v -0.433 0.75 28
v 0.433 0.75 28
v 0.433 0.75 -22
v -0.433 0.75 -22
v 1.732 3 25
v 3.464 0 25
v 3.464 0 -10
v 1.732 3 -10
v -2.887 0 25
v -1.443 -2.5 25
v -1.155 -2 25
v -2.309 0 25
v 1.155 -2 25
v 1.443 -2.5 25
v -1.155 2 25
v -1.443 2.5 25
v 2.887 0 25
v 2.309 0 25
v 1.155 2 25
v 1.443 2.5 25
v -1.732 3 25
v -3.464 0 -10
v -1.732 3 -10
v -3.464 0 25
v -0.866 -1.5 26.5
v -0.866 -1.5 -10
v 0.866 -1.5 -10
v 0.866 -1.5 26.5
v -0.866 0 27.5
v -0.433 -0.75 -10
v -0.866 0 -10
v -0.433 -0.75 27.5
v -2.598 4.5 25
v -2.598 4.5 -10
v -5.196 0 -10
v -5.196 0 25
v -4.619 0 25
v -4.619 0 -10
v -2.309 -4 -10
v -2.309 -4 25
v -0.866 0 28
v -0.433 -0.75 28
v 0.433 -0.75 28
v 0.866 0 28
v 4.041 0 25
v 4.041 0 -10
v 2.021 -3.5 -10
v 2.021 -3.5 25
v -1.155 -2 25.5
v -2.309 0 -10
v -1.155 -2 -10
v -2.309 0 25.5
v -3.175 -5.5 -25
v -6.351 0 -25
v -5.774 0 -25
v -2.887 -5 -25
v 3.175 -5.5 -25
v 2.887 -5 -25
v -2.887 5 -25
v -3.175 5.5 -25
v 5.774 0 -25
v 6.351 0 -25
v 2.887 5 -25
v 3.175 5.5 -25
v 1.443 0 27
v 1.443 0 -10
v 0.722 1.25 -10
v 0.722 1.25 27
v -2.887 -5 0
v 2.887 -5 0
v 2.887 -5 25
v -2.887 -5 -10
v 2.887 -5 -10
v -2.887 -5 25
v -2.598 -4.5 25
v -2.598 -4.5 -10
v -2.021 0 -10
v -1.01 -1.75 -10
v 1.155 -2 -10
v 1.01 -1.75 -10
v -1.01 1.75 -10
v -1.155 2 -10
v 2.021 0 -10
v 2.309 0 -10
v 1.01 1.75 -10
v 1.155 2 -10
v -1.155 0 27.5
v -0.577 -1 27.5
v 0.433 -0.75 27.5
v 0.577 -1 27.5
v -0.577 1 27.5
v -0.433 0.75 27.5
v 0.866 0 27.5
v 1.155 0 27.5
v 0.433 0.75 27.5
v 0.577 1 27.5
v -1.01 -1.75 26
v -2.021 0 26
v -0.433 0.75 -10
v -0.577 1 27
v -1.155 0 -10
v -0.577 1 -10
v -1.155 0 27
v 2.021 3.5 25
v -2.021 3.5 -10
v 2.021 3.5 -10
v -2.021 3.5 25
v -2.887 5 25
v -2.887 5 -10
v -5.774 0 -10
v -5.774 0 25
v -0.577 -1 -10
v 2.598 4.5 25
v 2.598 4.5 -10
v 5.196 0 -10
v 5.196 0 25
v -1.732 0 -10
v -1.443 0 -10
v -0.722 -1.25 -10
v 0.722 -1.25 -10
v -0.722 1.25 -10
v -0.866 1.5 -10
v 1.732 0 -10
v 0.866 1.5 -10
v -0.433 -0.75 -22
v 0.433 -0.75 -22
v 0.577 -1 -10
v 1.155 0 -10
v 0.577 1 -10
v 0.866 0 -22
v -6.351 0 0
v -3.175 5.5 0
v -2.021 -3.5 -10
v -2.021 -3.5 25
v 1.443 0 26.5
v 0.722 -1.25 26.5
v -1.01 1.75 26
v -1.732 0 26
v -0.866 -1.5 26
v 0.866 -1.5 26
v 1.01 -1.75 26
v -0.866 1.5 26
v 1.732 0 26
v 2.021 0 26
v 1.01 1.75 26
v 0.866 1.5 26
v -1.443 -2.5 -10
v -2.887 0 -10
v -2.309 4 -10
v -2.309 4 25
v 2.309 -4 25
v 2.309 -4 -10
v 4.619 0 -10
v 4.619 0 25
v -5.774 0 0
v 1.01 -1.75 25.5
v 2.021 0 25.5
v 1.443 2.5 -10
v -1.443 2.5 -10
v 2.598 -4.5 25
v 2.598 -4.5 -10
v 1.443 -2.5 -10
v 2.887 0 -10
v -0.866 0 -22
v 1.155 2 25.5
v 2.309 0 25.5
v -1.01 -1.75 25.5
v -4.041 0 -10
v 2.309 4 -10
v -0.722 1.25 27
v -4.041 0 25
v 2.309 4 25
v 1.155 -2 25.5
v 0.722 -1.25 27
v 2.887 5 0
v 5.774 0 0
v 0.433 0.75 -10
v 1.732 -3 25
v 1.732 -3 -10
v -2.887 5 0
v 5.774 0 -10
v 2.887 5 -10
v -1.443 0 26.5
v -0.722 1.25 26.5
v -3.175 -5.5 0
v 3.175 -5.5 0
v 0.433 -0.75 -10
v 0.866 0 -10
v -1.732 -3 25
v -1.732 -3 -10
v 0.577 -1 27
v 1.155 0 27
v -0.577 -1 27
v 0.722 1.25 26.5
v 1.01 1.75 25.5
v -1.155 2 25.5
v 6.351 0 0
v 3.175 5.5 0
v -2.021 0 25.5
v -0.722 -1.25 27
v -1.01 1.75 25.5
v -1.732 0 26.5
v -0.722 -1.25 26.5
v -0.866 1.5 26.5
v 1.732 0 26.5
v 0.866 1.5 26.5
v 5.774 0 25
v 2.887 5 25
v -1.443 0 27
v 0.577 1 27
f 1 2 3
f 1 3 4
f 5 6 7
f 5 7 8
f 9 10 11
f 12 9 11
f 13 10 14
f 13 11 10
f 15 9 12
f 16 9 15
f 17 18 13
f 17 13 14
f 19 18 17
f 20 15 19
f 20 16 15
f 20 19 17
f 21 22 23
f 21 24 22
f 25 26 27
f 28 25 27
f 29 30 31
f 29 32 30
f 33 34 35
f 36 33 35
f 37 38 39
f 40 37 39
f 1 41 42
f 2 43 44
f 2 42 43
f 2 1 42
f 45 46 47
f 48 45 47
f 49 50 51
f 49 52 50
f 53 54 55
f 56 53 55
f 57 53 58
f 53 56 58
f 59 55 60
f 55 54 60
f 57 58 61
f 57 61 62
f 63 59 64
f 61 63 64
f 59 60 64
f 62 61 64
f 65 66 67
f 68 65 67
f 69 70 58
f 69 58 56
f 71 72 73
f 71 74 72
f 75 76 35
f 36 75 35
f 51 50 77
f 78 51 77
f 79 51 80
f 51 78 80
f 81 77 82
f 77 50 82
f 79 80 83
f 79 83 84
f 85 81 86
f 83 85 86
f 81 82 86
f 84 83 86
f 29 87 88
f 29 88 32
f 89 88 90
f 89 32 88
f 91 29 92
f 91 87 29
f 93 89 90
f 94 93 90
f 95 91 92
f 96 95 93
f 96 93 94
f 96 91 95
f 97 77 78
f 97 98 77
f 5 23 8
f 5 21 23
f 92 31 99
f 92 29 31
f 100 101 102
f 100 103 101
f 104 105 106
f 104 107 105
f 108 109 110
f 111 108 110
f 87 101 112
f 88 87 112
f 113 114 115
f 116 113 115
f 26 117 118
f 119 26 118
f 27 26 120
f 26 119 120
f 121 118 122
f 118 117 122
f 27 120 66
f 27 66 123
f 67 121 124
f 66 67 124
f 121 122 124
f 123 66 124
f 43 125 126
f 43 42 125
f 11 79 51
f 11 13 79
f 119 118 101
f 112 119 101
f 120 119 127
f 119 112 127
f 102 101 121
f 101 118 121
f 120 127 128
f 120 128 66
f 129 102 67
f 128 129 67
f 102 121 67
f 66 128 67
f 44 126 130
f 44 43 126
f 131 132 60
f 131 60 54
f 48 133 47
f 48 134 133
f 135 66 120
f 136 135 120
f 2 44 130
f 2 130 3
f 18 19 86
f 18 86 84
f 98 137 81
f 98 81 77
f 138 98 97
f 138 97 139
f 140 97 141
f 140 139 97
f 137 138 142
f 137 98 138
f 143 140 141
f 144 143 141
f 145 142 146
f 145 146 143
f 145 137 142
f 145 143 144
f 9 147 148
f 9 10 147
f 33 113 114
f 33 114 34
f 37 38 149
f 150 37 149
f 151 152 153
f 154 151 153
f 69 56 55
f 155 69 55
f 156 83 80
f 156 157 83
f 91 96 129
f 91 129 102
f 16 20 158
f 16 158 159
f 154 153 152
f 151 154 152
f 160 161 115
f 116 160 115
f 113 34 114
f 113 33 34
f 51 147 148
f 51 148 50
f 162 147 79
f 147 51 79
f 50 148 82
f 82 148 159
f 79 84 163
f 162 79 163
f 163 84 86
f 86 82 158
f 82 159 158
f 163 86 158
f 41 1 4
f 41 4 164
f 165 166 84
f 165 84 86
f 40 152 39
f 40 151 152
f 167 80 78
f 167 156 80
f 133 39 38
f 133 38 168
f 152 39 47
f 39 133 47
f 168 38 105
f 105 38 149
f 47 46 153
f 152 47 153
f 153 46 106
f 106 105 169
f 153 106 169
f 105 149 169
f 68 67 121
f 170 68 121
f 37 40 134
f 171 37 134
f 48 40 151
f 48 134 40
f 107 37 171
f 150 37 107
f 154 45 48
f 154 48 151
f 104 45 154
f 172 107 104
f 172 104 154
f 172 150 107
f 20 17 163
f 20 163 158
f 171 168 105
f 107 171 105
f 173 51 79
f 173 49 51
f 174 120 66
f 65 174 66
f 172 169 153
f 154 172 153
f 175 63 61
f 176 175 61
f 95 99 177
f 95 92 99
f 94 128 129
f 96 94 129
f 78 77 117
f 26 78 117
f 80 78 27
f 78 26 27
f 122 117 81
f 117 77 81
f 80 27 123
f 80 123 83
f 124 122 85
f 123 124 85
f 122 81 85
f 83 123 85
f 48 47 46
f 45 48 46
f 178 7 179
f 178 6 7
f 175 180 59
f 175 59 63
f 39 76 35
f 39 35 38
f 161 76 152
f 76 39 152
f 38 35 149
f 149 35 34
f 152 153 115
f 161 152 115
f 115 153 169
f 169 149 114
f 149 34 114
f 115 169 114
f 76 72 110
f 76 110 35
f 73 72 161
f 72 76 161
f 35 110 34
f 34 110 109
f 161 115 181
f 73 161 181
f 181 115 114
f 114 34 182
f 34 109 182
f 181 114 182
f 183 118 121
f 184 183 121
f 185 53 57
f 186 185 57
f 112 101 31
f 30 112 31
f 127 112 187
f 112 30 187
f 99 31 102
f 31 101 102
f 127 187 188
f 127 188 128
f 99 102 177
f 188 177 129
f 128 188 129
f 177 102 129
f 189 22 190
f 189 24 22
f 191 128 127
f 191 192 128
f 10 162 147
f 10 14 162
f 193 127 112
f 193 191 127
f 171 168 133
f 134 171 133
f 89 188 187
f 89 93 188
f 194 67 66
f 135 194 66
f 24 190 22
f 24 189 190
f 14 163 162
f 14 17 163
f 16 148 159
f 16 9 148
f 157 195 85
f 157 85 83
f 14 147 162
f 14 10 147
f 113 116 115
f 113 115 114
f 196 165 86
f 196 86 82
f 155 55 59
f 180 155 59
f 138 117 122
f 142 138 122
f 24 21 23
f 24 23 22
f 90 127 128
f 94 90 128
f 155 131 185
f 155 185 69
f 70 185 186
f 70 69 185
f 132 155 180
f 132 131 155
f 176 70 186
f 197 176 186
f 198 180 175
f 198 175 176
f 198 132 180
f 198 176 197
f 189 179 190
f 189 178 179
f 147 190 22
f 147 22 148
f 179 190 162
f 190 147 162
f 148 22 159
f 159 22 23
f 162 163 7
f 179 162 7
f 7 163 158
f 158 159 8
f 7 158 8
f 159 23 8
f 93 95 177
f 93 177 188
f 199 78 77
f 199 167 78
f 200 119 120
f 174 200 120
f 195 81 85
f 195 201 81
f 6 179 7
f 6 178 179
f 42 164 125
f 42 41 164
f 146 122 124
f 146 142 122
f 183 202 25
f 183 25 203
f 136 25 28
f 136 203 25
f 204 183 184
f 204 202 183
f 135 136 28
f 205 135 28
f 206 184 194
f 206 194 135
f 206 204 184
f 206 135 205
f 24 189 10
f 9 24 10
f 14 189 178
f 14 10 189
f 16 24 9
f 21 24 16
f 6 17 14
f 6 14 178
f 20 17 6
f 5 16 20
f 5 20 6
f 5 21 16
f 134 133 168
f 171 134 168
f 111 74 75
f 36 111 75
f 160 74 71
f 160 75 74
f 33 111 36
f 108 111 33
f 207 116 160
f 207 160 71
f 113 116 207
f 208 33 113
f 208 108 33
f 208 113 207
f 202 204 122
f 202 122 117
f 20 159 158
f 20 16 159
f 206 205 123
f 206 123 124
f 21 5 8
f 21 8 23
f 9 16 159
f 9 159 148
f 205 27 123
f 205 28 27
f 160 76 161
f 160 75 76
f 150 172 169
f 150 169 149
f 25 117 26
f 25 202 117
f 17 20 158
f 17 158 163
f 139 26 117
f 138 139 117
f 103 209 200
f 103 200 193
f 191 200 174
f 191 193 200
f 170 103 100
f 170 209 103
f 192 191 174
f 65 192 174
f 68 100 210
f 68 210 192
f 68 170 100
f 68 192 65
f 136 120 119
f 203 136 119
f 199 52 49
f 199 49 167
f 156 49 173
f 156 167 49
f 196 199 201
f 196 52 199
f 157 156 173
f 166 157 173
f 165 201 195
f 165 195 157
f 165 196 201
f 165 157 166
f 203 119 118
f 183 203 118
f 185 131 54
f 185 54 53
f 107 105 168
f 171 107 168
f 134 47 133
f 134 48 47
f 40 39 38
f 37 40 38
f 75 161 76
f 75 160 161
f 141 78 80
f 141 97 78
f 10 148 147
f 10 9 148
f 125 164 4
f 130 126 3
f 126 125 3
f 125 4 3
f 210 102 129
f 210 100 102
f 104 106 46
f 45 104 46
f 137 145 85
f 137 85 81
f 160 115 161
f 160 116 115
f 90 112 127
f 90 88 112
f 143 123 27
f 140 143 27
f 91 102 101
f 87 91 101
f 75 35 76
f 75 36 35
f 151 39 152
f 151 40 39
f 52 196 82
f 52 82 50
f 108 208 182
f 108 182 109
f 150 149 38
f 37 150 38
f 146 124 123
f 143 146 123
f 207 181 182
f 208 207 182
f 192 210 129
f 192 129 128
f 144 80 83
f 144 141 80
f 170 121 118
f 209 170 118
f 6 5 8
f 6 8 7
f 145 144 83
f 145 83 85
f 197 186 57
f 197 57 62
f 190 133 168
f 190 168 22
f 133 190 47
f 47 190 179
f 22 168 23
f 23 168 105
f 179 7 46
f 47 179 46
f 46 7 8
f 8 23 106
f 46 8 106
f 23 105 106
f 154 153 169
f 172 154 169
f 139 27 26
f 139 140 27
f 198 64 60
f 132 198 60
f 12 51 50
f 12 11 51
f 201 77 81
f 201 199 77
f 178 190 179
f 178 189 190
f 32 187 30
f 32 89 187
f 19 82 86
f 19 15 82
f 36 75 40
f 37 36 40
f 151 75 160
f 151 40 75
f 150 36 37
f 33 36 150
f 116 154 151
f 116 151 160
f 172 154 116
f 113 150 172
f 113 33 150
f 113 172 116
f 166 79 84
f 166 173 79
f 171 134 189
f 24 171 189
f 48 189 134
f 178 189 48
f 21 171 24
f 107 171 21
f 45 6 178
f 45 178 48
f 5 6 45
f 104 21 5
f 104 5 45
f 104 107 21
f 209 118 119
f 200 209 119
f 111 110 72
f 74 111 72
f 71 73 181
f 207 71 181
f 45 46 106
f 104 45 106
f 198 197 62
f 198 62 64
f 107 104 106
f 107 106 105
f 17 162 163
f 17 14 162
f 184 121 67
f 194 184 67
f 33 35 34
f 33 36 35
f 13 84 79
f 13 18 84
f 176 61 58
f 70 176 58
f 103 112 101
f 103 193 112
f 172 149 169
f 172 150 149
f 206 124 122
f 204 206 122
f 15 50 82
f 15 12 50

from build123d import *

# Parameters (mm, degrees)
F1_DEPTH       = 25
F2_DEPTH       = 28
F2_DEPTH_BACK  = 22
F3_DEPTH       = 27.5
F3_DEPTH_BACK  = 10
F4_DEPTH       = 27
F4_DEPTH_BACK  = 10
F5_DEPTH       = 26.5
F5_DEPTH_BACK  = 10
F6_DEPTH       = 26
F6_DEPTH_BACK  = 10
F7_DEPTH       = 25.5
F7_DEPTH_BACK  = 10
F8_DEPTH       = 25
F8_DEPTH_BACK  = 10
F9_DEPTH       = 25
F9_DEPTH_BACK  = 10
F10_DEPTH      = 25
F10_DEPTH_BACK = 10
F11_DEPTH      = 25
F11_DEPTH_BACK = 10
F12_DEPTH      = 25
F12_DEPTH_BACK = 10
F13_DEPTH      = 25
F13_DEPTH_BACK = 10


with BuildPart() as f1:
    # F0 (on Top) → F1 (new body)
    with BuildSketch(Plane.XY):
        Polygon((3.1754264805, -5.5), (6.3508529611, 0), (3.1754264805, 5.5), (-3.1754264805, 5.5), (-6.3508529611, 0), (-3.1754264805, -5.5), align=None)
        Polygon((2.8867513459, 5), (5.7735026919, 0), (2.8867513459, -5), (-2.8867513459, -5), (-5.7735026919, 0), (-2.8867513459, 5), align=None, mode=Mode.SUBTRACT)
    extrude(amount=-F1_DEPTH)


with BuildPart() as f2:
    # F0 (on Top) → F2 (new body, two sides)
    with BuildSketch(Plane.XY) as f2_sk:
        Polygon((0.4330127019, -0.75), (0.8660254038, 0), (0.4330127019, 0.75), (-0.4330127019, 0.75), (-0.8660254038, 0), (-0.4330127019, -0.75), align=None)
    extrude(amount=F2_DEPTH)
    extrude(f2_sk.sketch, amount=-F2_DEPTH_BACK)


with BuildPart() as f3:
    # F0 (on Top) → F3 (new body, two sides)
    with BuildSketch(Plane.XY) as f3_sk:
        Polygon((0.5773502692, -1), (1.1547005384, 0), (0.5773502692, 1), (-0.5773502692, 1), (-1.1547005384, 0), (-0.5773502692, -1), align=None)
        Polygon((0.4330127019, 0.75), (0.8660254038, 0), (0.4330127019, -0.75), (-0.4330127019, -0.75), (-0.8660254038, 0), (-0.4330127019, 0.75), align=None, mode=Mode.SUBTRACT)
    extrude(amount=F3_DEPTH)
    extrude(f3_sk.sketch, amount=-F3_DEPTH_BACK)


with BuildPart() as f4:
    # F0 (on Top) → F4 (new body, two sides)
    with BuildSketch(Plane.XY) as f4_sk:
        Polygon((0.7216878365, -1.25), (1.443375673, 0), (0.7216878365, 1.25), (-0.7216878365, 1.25), (-1.443375673, 0), (-0.7216878365, -1.25), align=None)
        Polygon((0.5773502692, 1), (1.1547005384, 0), (0.5773502692, -1), (-0.5773502692, -1), (-1.1547005384, 0), (-0.5773502692, 1), align=None, mode=Mode.SUBTRACT)
    extrude(amount=F4_DEPTH)
    extrude(f4_sk.sketch, amount=-F4_DEPTH_BACK)


with BuildPart() as f5:
    # F0 (on Top) → F5 (new body, two sides)
    with BuildSketch(Plane.XY) as f5_sk:
        Polygon((0.8660254038, -1.5), (1.7320508076, 0), (0.8660254038, 1.5), (-0.8660254038, 1.5), (-1.7320508076, 0), (-0.8660254038, -1.5), align=None)
        Polygon((0.7216878365, 1.25), (1.443375673, 0), (0.7216878365, -1.25), (-0.7216878365, -1.25), (-1.443375673, 0), (-0.7216878365, 1.25), align=None, mode=Mode.SUBTRACT)
    extrude(amount=F5_DEPTH)
    extrude(f5_sk.sketch, amount=-F5_DEPTH_BACK)


with BuildPart() as f6:
    # F0 (on Top) → F6 (new body, two sides)
    with BuildSketch(Plane.XY) as f6_sk:
        Polygon((1.0103629711, -1.75), (2.0207259422, 0), (1.0103629711, 1.75), (-1.0103629711, 1.75), (-2.0207259422, 0), (-1.0103629711, -1.75), align=None)
        Polygon((0.8660254038, 1.5), (1.7320508076, 0), (0.8660254038, -1.5), (-0.8660254038, -1.5), (-1.7320508076, 0), (-0.8660254038, 1.5), align=None, mode=Mode.SUBTRACT)
    extrude(amount=F6_DEPTH)
    extrude(f6_sk.sketch, amount=-F6_DEPTH_BACK)


with BuildPart() as f7:
    # F0 (on Top) → F7 (new body, two sides)
    with BuildSketch(Plane.XY) as f7_sk:
        Polygon((1.1547005384, -2), (2.3094010768, 0), (1.1547005384, 2), (-1.1547005384, 2), (-2.3094010768, 0), (-1.1547005384, -2), align=None)
        Polygon((1.0103629711, 1.75), (2.0207259422, 0), (1.0103629711, -1.75), (-1.0103629711, -1.75), (-2.0207259422, 0), (-1.0103629711, 1.75), align=None, mode=Mode.SUBTRACT)
    extrude(amount=F7_DEPTH)
    extrude(f7_sk.sketch, amount=-F7_DEPTH_BACK)


with BuildPart() as f8:
    # F0 (on Top) → F8 (new body, two sides)
    with BuildSketch(Plane.XY) as f8_sk:
        Polygon((1.443375673, -2.5), (2.8867513459, 0), (1.443375673, 2.5), (-1.443375673, 2.5), (-2.8867513459, 0), (-1.443375673, -2.5), align=None)
        Polygon((1.1547005384, 2), (2.3094010768, 0), (1.1547005384, -2), (-1.1547005384, -2), (-2.3094010768, 0), (-1.1547005384, 2), align=None, mode=Mode.SUBTRACT)
    extrude(amount=F8_DEPTH)
    extrude(f8_sk.sketch, amount=-F8_DEPTH_BACK)


with BuildPart() as f9:
    # F0 (on Top) → F9 (new body, two sides)
    with BuildSketch(Plane.XY) as f9_sk:
        Polygon((1.7320508076, -3), (3.4641016151, 0), (1.7320508076, 3), (-1.7320508076, 3), (-3.4641016151, 0), (-1.7320508076, -3), align=None)
        Polygon((1.443375673, 2.5), (2.8867513459, 0), (1.443375673, -2.5), (-1.443375673, -2.5), (-2.8867513459, 0), (-1.443375673, 2.5), align=None, mode=Mode.SUBTRACT)
    extrude(amount=F9_DEPTH)
    extrude(f9_sk.sketch, amount=-F9_DEPTH_BACK)


with BuildPart() as f10:
    # F0 (on Top) → F10 (new body, two sides)
    with BuildSketch(Plane.XY) as f10_sk:
        Polygon((2.0207259422, -3.5), (4.0414518843, 0), (2.0207259422, 3.5), (-2.0207259422, 3.5), (-4.0414518843, 0), (-2.0207259422, -3.5), align=None)
        Polygon((1.7320508076, 3), (3.4641016151, 0), (1.7320508076, -3), (-1.7320508076, -3), (-3.4641016151, 0), (-1.7320508076, 3), align=None, mode=Mode.SUBTRACT)
    extrude(amount=F10_DEPTH)
    extrude(f10_sk.sketch, amount=-F10_DEPTH_BACK)


with BuildPart() as f11:
    # F0 (on Top) → F11 (new body, two sides)
    with BuildSketch(Plane.XY) as f11_sk:
        Polygon((2.3094010768, -4), (4.6188021535, 0), (2.3094010768, 4), (-2.3094010768, 4), (-4.6188021535, 0), (-2.3094010768, -4), align=None)
        Polygon((2.0207259422, 3.5), (4.0414518843, 0), (2.0207259422, -3.5), (-2.0207259422, -3.5), (-4.0414518843, 0), (-2.0207259422, 3.5), align=None, mode=Mode.SUBTRACT)
    extrude(amount=F11_DEPTH)
    extrude(f11_sk.sketch, amount=-F11_DEPTH_BACK)


with BuildPart() as f12:
    # F0 (on Top) → F12 (new body, two sides)
    with BuildSketch(Plane.XY) as f12_sk:
        Polygon((2.5980762114, -4.5), (5.1961524227, 0), (2.5980762114, 4.5), (-2.5980762114, 4.5), (-5.1961524227, 0), (-2.5980762114, -4.5), align=None)
        Polygon((2.3094010768, 4), (4.6188021535, 0), (2.3094010768, -4), (-2.3094010768, -4), (-4.6188021535, 0), (-2.3094010768, 4), align=None, mode=Mode.SUBTRACT)
    extrude(amount=F12_DEPTH)
    extrude(f12_sk.sketch, amount=-F12_DEPTH_BACK)


with BuildPart() as f13:
    # F0 (on Top) → F13 (new body, two sides)
    with BuildSketch(Plane.XY) as f13_sk:
        Polygon((2.8867513459, -5), (5.7735026919, 0), (2.8867513459, 5), (-2.8867513459, 5), (-5.7735026919, 0), (-2.8867513459, -5), align=None)
        Polygon((2.5980762114, 4.5), (5.1961524227, 0), (2.5980762114, -4.5), (-2.5980762114, -4.5), (-5.1961524227, 0), (-2.5980762114, 4.5), align=None, mode=Mode.SUBTRACT)
    extrude(amount=F13_DEPTH)
    extrude(f13_sk.sketch, amount=-F13_DEPTH_BACK)


solid = Compound([f1.part, f2.part, f3.part, f4.part, f5.part, f6.part, f7.part, f8.part, f9.part, f10.part, f11.part, f12.part, f13.part])
